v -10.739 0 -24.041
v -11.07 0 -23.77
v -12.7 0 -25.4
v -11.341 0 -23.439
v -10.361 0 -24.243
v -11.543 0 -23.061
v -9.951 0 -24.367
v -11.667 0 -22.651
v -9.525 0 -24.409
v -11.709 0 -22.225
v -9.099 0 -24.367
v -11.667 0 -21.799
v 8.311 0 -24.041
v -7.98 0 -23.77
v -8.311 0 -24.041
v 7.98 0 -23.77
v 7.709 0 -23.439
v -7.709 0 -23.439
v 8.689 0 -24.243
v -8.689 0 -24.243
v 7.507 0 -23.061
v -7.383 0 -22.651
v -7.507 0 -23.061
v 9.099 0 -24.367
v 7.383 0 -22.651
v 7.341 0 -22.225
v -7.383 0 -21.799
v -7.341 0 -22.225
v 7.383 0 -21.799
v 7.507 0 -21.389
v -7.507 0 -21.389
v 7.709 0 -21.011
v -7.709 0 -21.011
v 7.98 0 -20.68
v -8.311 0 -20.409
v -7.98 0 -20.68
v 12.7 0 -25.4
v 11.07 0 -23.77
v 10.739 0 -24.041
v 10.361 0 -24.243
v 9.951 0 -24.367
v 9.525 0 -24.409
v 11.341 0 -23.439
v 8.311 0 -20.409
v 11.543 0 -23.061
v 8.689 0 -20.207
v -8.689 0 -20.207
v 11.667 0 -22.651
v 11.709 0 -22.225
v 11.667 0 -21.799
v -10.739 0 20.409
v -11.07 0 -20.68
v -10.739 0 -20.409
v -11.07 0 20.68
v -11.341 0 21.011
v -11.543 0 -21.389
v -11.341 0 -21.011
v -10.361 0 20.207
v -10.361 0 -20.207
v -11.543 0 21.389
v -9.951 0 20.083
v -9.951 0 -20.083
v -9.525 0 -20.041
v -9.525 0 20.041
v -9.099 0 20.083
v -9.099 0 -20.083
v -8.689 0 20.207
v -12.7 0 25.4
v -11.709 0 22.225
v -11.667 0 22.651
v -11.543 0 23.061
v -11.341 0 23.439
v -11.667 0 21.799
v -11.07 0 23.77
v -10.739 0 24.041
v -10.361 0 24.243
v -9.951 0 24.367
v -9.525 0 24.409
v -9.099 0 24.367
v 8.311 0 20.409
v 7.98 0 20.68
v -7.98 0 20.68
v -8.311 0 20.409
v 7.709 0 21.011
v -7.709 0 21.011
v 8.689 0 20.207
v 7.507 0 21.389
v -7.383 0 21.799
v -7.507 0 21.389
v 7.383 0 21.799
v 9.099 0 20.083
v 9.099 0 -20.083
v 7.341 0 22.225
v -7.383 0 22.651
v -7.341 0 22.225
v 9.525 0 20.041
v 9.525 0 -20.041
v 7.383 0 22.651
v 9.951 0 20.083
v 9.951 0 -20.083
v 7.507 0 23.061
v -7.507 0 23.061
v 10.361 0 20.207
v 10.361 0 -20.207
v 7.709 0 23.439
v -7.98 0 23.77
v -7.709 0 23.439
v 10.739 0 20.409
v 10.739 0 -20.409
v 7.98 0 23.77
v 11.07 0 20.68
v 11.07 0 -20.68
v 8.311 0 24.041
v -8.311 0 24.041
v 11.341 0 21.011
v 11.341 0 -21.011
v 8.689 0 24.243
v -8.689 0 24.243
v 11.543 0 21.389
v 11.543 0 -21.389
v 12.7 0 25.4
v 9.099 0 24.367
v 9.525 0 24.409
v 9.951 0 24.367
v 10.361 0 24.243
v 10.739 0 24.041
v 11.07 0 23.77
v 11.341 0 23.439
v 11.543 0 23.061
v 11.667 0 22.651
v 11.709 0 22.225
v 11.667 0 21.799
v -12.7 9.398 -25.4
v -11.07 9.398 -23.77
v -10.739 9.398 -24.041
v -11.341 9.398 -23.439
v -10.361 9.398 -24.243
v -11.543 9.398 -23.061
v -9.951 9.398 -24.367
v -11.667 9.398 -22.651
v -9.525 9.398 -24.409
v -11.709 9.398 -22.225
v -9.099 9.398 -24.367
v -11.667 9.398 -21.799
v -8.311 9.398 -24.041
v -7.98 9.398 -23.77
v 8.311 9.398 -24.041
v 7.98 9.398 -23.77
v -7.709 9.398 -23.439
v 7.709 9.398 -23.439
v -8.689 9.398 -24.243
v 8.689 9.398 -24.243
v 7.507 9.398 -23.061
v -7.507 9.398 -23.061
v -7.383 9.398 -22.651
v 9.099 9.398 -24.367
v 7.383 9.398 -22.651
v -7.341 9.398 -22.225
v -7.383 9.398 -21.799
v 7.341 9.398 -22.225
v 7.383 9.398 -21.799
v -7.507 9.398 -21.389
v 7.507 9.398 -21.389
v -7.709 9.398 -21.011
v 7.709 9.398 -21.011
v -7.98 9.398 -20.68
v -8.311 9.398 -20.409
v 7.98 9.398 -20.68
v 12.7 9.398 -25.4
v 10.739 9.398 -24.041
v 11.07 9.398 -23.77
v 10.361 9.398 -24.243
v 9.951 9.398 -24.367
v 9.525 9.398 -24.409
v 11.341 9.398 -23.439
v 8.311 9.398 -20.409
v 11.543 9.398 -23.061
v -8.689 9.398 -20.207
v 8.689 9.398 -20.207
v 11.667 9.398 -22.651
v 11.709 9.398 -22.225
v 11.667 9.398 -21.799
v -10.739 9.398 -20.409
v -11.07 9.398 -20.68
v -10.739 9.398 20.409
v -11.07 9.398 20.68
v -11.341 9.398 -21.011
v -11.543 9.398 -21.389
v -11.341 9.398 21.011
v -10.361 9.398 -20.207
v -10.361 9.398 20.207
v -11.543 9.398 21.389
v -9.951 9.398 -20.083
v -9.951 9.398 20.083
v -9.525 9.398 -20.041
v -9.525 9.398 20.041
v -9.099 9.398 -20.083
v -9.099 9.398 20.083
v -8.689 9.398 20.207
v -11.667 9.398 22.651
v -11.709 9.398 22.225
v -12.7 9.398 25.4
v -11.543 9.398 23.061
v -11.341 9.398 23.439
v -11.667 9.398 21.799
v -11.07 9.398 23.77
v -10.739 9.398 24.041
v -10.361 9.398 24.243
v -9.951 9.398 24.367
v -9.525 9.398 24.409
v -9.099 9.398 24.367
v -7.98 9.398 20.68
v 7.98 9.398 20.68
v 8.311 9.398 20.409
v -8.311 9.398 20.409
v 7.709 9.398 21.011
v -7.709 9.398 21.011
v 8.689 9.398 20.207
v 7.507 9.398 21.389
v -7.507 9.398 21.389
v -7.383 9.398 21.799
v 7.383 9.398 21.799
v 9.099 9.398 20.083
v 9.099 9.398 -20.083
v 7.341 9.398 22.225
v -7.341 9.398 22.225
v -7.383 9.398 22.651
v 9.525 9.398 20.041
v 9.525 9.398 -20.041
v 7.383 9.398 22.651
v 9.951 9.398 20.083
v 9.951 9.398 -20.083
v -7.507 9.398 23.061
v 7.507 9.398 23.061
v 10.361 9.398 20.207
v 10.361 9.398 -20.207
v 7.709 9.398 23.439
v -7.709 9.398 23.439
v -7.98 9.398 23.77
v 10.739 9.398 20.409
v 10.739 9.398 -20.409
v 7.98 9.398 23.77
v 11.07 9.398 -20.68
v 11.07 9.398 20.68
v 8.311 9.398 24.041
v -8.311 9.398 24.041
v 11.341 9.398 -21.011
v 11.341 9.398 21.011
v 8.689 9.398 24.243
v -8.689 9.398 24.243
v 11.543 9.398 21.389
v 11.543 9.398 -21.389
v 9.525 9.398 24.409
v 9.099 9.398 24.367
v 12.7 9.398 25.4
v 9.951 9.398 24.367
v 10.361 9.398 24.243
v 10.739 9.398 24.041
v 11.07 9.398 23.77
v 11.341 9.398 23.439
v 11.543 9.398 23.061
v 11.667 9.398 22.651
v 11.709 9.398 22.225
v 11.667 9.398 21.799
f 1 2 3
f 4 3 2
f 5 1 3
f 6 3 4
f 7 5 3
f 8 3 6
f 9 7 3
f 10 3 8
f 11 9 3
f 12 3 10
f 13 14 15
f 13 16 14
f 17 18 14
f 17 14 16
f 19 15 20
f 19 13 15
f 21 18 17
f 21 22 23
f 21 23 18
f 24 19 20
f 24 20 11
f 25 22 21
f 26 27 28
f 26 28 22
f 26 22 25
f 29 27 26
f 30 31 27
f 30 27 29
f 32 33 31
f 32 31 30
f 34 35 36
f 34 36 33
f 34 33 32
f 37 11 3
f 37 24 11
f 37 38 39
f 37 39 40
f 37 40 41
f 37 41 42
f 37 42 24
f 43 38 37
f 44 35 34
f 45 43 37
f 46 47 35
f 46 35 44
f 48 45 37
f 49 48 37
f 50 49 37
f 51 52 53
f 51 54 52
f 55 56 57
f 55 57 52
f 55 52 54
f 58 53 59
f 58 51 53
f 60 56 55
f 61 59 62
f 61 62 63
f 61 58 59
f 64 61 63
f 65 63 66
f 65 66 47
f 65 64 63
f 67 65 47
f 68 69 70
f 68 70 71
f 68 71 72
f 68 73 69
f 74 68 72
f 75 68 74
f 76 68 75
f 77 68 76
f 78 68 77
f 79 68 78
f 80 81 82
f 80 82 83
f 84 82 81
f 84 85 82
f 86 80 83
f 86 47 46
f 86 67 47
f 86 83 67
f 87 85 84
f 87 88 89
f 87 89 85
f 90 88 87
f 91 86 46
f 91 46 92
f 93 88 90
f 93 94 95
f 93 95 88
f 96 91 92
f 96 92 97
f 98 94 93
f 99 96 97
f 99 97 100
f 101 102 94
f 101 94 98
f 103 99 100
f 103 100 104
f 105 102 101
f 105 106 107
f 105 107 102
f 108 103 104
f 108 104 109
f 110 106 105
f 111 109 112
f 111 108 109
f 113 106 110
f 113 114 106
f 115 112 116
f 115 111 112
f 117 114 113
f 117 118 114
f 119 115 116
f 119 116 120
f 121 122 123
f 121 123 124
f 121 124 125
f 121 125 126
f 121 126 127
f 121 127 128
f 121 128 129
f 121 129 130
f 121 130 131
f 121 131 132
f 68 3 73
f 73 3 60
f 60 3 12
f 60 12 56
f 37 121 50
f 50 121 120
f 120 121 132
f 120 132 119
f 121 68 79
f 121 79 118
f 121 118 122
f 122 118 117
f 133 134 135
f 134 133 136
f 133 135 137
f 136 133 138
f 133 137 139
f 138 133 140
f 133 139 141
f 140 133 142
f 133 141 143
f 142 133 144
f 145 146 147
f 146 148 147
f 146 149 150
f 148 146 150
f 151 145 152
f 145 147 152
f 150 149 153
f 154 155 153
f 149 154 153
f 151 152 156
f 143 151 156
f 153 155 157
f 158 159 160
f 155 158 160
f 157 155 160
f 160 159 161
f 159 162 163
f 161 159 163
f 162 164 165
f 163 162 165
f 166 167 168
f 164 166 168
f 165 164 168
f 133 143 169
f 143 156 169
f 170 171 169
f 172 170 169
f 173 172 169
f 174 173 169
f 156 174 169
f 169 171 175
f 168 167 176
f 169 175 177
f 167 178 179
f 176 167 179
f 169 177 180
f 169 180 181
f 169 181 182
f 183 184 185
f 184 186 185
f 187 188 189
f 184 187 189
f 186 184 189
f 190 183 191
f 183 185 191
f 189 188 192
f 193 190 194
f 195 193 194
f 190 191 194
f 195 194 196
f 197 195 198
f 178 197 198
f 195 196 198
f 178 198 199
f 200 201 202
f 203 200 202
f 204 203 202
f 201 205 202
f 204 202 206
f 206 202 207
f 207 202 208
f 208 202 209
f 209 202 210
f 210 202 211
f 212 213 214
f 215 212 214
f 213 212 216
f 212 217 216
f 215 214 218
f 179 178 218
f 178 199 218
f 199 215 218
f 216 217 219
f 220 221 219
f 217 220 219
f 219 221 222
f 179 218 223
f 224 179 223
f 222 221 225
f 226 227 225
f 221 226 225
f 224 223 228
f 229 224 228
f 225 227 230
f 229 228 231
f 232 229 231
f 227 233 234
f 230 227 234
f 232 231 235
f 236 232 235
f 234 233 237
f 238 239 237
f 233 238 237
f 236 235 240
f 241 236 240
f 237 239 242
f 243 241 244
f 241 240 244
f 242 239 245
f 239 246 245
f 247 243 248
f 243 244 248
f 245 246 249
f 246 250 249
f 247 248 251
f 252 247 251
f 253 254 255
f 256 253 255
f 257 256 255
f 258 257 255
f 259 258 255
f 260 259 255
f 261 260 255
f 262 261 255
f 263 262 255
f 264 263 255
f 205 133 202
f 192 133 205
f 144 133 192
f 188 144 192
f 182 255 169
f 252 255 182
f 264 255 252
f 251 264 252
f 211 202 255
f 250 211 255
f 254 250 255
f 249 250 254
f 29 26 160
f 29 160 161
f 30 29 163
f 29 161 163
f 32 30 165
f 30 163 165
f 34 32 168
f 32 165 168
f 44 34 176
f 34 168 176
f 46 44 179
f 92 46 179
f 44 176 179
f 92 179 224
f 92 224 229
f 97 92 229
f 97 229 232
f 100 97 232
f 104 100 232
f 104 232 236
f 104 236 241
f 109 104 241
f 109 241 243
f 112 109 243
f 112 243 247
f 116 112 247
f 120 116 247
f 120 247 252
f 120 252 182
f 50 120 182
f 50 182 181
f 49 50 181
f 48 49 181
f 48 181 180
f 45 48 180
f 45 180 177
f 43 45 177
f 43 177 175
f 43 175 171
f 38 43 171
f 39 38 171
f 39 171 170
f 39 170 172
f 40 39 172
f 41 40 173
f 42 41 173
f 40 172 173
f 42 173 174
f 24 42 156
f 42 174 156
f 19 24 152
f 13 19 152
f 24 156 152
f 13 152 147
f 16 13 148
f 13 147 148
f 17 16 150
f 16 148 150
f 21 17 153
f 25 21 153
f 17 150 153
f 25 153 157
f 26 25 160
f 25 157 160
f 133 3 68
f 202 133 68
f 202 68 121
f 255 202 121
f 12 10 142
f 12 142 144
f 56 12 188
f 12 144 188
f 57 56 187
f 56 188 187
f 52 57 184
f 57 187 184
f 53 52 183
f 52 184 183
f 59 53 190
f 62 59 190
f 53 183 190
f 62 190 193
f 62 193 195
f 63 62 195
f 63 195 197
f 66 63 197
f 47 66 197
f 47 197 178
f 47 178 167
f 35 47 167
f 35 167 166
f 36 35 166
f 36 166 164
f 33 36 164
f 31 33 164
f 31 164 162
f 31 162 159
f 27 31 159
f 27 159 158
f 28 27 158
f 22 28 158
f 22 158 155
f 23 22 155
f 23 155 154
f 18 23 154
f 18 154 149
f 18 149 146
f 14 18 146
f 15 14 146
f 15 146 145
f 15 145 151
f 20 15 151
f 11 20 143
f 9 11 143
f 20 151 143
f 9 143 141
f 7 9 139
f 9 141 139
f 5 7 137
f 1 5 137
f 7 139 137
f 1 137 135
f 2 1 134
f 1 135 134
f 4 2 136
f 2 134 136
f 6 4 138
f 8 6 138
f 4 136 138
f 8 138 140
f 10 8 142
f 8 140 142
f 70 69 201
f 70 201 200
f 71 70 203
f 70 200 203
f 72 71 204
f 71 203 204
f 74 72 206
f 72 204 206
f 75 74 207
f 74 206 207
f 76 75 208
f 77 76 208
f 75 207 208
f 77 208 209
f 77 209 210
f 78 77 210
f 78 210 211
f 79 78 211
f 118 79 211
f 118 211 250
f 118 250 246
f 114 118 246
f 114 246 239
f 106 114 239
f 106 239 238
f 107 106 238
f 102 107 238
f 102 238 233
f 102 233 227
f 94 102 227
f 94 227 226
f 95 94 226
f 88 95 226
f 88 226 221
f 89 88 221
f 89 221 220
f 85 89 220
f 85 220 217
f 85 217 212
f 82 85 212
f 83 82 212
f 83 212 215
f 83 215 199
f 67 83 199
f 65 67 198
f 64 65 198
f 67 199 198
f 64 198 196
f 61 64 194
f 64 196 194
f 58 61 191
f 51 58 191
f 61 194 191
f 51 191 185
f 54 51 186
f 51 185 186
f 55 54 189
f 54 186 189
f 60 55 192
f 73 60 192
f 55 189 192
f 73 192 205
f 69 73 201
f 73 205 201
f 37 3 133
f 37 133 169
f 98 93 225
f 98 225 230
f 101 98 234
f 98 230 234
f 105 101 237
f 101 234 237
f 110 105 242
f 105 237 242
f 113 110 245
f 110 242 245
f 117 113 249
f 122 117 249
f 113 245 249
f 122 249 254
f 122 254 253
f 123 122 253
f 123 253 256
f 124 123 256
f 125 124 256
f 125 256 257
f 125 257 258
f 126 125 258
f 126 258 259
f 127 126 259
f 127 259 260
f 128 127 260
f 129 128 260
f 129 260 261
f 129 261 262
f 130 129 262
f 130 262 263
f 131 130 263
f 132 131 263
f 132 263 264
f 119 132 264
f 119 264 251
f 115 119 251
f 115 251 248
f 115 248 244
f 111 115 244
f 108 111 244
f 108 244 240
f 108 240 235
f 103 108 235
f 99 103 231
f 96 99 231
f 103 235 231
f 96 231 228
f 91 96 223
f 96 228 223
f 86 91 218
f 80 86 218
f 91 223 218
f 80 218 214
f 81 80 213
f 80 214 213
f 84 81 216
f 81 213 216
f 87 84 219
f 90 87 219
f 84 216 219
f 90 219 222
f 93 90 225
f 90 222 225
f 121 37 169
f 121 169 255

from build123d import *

# Parameters (mm, degrees)
F0_W     = 25.4
F0_H     = 50.8
F1_DEPTH = 9.398
F2_D     = 4.3688


with BuildPart() as f1:
    # F0 (on Front) → F1 (new body)
    with BuildSketch(Plane.XZ):
        Rectangle(F0_W, F0_H)
    extrude(amount=-F1_DEPTH)

    # F2 (through all)
    with Locations(Plane.XZ):
        with Locations((-9.525, 22.225), (9.525, 22.225), (9.525, -22.225), (-9.525, -22.225)):
            Hole(F2_D / 2)


solid = f1.part
